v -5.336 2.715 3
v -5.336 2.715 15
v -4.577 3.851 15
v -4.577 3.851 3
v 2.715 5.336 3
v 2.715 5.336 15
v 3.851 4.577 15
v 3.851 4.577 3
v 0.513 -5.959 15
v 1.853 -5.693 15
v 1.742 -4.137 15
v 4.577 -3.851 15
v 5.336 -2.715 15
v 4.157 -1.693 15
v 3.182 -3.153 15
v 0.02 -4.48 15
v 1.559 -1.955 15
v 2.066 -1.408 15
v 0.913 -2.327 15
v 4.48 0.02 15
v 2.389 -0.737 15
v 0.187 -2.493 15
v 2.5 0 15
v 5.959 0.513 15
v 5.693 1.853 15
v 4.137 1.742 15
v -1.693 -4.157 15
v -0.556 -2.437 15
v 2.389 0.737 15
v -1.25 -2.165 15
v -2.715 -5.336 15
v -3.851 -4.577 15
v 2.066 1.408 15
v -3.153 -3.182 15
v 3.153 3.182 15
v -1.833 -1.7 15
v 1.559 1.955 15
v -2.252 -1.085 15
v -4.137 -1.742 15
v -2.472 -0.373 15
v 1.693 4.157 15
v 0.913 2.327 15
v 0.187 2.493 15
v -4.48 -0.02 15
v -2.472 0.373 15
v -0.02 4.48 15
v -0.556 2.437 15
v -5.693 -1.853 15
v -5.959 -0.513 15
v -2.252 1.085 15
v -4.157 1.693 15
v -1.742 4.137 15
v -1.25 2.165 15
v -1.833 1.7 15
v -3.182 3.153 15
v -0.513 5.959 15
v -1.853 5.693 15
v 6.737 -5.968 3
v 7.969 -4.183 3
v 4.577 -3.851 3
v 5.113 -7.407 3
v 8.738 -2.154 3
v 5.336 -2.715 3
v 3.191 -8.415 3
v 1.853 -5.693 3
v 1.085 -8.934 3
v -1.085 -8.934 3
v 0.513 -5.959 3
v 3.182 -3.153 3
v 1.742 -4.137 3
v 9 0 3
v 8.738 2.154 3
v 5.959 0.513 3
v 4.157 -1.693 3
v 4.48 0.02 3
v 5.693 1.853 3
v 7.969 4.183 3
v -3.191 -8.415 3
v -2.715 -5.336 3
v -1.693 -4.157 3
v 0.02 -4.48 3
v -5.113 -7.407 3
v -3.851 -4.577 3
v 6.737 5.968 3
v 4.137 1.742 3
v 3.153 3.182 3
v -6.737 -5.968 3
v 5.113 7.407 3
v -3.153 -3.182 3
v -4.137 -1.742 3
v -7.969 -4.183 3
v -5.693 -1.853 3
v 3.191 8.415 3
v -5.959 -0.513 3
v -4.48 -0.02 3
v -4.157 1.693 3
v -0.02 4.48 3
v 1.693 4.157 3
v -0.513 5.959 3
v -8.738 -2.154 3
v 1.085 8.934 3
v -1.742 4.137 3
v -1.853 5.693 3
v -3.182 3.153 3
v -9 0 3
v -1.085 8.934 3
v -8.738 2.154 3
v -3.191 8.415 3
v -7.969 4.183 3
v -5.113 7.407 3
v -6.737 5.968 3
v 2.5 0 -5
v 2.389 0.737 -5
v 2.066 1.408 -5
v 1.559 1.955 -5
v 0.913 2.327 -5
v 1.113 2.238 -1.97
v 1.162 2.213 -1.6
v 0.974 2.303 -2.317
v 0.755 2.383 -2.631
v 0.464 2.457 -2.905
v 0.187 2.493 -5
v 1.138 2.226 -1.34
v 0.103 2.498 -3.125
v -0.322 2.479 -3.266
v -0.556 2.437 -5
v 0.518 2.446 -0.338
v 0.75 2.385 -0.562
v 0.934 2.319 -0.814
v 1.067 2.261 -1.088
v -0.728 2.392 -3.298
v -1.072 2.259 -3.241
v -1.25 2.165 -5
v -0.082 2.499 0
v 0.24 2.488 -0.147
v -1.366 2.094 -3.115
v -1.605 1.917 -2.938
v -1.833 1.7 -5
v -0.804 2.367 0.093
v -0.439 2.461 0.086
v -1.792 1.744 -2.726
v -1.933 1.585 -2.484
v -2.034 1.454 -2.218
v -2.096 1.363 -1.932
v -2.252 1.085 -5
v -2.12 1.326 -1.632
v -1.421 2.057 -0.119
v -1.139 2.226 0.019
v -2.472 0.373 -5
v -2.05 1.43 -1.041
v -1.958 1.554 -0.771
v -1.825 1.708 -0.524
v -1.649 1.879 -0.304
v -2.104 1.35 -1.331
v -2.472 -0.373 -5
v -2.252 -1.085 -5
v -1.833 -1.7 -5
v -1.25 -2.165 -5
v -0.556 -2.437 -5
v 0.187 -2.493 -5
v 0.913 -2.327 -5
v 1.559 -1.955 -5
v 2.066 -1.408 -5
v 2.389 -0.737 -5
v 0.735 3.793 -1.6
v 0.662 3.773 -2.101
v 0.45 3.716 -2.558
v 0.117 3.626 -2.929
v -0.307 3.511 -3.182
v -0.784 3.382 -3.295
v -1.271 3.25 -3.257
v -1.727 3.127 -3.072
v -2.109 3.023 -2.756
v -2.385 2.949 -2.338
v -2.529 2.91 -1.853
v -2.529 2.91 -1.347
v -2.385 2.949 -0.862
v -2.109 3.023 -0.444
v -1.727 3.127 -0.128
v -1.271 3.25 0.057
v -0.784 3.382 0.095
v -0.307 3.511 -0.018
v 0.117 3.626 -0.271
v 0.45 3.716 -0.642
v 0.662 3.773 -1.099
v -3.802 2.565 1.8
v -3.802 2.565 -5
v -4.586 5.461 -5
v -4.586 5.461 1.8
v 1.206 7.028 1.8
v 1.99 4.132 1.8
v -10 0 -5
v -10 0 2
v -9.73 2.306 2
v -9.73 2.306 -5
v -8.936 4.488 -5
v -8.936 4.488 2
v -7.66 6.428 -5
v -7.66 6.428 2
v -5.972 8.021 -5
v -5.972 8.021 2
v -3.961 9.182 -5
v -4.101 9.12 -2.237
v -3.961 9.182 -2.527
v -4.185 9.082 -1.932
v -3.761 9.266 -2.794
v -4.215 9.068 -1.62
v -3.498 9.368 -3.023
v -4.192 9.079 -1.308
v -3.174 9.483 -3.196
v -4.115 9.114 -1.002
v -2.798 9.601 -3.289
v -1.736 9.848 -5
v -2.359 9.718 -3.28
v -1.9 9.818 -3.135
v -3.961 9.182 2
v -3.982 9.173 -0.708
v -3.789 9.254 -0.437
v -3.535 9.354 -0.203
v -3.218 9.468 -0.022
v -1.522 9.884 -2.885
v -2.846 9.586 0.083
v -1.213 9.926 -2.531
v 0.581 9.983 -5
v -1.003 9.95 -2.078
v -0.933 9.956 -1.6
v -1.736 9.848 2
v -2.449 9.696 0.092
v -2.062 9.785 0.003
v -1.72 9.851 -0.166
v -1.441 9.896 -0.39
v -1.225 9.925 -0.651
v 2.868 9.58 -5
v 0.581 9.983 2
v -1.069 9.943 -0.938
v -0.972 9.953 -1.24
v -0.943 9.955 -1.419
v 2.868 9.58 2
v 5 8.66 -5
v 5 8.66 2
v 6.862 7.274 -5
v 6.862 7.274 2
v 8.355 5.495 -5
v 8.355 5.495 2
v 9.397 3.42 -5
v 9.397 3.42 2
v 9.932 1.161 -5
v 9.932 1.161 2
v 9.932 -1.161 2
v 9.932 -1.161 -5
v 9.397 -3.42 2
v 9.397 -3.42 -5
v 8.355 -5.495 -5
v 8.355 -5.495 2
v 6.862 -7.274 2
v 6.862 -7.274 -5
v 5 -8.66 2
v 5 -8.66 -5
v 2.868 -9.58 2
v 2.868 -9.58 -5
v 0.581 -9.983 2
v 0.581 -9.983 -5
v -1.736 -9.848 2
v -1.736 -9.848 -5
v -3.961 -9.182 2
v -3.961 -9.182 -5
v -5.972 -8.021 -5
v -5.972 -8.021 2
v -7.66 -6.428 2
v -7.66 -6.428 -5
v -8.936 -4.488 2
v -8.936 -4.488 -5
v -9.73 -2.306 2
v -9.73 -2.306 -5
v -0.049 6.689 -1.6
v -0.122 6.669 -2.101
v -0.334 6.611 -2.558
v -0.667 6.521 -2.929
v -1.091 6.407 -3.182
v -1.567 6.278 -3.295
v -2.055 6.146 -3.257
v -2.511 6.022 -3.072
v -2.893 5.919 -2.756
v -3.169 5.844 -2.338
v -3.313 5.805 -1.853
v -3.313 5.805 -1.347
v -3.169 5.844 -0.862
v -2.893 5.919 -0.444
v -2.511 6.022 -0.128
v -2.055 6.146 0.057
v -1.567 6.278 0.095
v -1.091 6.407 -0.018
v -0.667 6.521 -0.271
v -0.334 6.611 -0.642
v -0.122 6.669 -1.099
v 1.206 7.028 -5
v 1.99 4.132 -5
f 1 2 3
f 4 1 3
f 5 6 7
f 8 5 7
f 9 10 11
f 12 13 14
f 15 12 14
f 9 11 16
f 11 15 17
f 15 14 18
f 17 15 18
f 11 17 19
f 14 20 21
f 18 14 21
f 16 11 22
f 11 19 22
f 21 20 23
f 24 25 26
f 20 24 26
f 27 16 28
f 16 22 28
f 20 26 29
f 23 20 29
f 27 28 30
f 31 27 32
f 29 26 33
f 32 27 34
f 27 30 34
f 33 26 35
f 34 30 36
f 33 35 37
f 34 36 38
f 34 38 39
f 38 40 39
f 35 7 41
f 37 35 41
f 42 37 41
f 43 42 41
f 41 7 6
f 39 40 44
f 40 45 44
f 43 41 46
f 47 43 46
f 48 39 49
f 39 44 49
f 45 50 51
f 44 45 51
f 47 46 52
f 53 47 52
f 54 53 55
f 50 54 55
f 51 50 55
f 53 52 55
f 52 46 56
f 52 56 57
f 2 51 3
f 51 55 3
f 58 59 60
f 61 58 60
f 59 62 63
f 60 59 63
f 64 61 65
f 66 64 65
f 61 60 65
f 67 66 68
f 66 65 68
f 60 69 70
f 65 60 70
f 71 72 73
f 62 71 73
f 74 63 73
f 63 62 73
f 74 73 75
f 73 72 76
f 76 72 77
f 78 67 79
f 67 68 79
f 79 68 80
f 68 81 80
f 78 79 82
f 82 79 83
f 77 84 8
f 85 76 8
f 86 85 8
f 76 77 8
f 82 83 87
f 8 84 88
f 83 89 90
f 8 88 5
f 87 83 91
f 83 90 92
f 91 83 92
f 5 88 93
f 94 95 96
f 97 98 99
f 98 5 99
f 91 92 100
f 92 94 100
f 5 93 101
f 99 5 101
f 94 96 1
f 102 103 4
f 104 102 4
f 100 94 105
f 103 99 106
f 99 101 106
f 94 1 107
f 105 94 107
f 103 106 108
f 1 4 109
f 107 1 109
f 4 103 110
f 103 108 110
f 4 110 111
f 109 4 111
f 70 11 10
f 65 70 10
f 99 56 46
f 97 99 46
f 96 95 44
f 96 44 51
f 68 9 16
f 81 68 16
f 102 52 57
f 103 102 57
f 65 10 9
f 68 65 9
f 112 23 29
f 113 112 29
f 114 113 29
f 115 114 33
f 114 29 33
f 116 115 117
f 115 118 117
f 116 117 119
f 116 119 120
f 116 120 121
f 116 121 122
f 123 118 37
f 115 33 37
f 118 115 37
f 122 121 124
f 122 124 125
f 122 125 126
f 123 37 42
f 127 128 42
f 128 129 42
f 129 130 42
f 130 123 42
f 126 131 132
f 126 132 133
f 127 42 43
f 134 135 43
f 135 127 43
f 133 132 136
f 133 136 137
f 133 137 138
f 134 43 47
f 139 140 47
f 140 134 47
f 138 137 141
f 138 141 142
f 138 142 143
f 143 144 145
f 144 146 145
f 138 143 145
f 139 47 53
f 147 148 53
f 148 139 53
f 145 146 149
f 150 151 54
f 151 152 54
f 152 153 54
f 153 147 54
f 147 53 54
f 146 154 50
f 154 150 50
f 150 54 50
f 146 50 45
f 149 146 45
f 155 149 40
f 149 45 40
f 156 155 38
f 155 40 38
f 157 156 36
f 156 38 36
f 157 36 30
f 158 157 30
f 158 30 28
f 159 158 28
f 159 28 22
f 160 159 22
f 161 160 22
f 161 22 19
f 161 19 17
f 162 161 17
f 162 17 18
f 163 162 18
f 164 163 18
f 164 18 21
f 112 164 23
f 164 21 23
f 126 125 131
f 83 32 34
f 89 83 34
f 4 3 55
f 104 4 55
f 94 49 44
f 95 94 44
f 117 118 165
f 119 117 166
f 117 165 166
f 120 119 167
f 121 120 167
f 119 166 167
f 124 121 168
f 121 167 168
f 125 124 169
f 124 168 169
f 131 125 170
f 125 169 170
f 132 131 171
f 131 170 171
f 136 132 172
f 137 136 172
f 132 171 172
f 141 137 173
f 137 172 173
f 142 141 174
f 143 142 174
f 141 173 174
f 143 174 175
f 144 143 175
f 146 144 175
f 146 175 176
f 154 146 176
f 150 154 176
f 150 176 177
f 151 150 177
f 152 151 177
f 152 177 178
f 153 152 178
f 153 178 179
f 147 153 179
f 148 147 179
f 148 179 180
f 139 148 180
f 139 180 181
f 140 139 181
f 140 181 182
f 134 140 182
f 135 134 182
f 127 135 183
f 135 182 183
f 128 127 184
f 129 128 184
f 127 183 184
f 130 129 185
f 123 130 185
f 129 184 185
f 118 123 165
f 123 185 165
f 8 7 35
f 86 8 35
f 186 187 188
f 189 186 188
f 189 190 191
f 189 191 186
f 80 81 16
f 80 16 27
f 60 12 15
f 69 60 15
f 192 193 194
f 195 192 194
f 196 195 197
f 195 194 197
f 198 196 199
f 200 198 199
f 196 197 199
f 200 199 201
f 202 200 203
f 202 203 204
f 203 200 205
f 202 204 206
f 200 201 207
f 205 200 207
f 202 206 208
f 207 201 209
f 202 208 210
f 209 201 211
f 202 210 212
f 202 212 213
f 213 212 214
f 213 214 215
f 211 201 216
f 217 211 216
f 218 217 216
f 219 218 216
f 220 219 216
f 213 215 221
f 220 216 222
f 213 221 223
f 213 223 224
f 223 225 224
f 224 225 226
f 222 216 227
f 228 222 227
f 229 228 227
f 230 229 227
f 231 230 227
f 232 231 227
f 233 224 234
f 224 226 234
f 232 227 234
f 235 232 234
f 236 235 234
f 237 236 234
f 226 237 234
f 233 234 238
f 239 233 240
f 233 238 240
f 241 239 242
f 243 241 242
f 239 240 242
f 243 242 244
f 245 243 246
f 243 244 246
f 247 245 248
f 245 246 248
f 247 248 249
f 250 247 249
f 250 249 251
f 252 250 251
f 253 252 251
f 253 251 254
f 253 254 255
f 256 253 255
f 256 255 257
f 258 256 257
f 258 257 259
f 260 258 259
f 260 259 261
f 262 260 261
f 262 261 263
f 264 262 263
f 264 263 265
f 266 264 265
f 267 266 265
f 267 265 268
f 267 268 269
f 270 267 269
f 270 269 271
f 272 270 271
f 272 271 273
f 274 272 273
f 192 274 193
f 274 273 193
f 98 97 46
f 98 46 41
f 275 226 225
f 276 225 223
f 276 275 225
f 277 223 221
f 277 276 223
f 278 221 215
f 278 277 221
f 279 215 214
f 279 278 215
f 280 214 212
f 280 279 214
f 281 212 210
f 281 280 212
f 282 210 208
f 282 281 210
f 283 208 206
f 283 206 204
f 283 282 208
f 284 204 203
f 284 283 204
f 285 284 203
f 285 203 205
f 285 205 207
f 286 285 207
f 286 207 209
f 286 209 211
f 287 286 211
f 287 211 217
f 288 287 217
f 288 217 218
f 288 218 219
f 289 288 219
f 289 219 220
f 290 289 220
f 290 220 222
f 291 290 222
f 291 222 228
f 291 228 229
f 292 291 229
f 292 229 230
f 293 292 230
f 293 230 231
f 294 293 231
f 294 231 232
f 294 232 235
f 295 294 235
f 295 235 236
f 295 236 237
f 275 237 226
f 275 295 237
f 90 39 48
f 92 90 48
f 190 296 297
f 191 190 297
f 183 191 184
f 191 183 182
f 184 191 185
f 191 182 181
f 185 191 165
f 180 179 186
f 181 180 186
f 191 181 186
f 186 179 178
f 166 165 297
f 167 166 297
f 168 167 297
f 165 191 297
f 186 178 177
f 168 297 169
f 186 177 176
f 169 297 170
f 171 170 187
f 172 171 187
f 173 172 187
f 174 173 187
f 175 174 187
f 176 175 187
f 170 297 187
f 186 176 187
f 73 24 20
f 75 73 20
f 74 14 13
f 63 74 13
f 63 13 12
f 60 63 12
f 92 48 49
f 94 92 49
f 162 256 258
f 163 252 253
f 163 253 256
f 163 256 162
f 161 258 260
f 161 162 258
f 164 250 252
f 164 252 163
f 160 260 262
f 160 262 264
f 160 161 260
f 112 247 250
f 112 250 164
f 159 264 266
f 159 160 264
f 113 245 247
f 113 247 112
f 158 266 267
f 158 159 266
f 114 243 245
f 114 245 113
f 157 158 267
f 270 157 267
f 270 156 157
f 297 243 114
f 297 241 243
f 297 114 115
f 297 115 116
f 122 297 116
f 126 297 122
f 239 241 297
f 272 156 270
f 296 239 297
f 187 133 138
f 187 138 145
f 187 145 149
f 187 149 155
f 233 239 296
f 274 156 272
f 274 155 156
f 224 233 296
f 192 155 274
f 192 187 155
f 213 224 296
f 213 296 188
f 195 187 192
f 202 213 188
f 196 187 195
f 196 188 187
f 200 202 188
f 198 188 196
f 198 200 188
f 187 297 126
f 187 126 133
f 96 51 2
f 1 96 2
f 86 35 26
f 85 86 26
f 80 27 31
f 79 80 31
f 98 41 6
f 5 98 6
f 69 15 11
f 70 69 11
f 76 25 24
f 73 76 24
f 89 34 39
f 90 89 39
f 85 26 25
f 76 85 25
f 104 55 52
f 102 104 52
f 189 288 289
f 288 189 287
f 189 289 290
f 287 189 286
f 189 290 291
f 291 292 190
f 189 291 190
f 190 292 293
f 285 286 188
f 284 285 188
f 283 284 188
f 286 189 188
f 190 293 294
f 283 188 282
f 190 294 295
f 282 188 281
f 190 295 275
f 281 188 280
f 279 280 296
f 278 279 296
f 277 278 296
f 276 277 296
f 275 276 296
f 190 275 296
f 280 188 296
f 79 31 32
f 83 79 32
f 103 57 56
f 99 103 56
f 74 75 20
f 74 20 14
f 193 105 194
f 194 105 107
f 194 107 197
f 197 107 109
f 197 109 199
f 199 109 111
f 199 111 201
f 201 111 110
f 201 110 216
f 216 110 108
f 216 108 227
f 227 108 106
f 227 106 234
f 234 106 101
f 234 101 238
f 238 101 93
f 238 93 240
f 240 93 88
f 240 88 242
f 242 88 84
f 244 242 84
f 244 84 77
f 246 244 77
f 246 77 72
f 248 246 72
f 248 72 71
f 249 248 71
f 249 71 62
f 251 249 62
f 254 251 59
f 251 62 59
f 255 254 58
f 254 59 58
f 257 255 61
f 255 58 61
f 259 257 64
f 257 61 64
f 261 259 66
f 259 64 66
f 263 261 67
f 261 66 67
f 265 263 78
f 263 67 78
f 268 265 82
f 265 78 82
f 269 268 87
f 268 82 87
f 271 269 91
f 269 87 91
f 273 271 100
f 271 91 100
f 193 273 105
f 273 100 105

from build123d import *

# Parameters (mm, degrees)
SKETCH1_R               = 2.500000508
BOSS_EXTRUDE1_DEPTH     = 12
SKETCH2_R               = 10
BOSS_EXTRUDE2_DEPTH     = 8
CUT_EXTRUDE5_DEPTH      = 6.8
SKETCH10_R              = 2.500000508
CUT_EXTRUDE6_DEPTH      = 10
CHAMFER1_SIZE           = 1
SKETCH11_R              = 1.7
CUT_EXTRUDE7_DEPTH      = 10
CUT_EXTRUDE7_DEPTH_BACK = 2


with BuildPart() as part:
    # Sketch1 → Boss-Extrude1 (new body)
    with BuildSketch(Plane.XY.offset(15)):
        Polygon((-0.020282, 4.479718), (1.693392048, 4.157458362), (2.715058109, 5.335905553), (3.851065458, 4.576848343), (3.153297436, 3.181980515), (4.137176, 1.742358), (5.692891, 1.853219), (5.959435, 0.513206), (4.479718, 0.020282), (4.157458362, -1.693392048), (5.335905553, -2.715058109), (4.576848343, -3.851065458), (3.181980515, -3.153297436), (1.742358, -4.137176), (1.853219, -5.692891), (0.513206, -5.959435), (0.020282, -4.479718), (-1.693392048, -4.157458362), (-2.715058109, -5.335905553), (-3.851065458, -4.576848343), (-3.153297436, -3.181980515), (-4.137176, -1.742358), (-5.692891, -1.853219), (-5.959435, -0.513206), (-4.479718, -0.020282), (-4.157458362, 1.693392048), (-5.335905553, 2.715058109), (-4.576848343, 3.851065458), (-3.181980515, 3.153297436), (-1.742358, 4.137176), (-1.853219, 5.692891), (-0.513206, 5.959435), align=None)
        Circle(SKETCH1_R, mode=Mode.SUBTRACT)
    extrude(amount=-BOSS_EXTRUDE1_DEPTH)

    # Sketch2 → Boss-Extrude2 (add)
    with BuildSketch(Plane(origin=(0, 0, 3), x_dir=(-1, 0, 0), z_dir=(0, 0, -1))):
        Circle(SKETCH2_R)
    extrude(amount=BOSS_EXTRUDE2_DEPTH)

    # Sketch9 → Cut-Extrude5 (cut)
    with BuildSketch(Plane(origin=(0, 0, -5), x_dir=(-1, 0, 0), z_dir=(0, 0, -1))):
        Polygon((3.802129012, 2.564951973), (4.58587219, 5.460767338), (-1.20575854, 7.028253696), (-1.989501719, 4.13243833), align=None)
    extrude(amount=-CUT_EXTRUDE5_DEPTH, mode=Mode.SUBTRACT)

    # Sketch10 → Cut-Extrude6 (cut)
    with BuildSketch(Plane.XY.offset(3)):
        Circle(SKETCH10_R)
    extrude(amount=-CUT_EXTRUDE6_DEPTH, mode=Mode.SUBTRACT)

    # Chamfer1
    chamfer1_edges = [part.edges().sort_by_distance(p)[0] for p in [
        (10, 0, 3),
    ]]
    chamfer(chamfer1_edges, length=CHAMFER1_SIZE)

    # Sketch11 → Cut-Extrude7 (cut, two sides)
    with BuildSketch(Plane(origin=(-0.906313646, 3.348695152, 0), x_dir=(0.965271788, 0.261247726, 0), z_dir=(-0.261247726, 0.965271788, 0))) as cut_extrude7_sk:
        with Locations((0, 1.6)):
            Circle(SKETCH11_R)
    extrude(amount=CUT_EXTRUDE7_DEPTH, mode=Mode.SUBTRACT)
    extrude(cut_extrude7_sk.sketch, amount=-CUT_EXTRUDE7_DEPTH_BACK, mode=Mode.SUBTRACT)


solid = part.part
